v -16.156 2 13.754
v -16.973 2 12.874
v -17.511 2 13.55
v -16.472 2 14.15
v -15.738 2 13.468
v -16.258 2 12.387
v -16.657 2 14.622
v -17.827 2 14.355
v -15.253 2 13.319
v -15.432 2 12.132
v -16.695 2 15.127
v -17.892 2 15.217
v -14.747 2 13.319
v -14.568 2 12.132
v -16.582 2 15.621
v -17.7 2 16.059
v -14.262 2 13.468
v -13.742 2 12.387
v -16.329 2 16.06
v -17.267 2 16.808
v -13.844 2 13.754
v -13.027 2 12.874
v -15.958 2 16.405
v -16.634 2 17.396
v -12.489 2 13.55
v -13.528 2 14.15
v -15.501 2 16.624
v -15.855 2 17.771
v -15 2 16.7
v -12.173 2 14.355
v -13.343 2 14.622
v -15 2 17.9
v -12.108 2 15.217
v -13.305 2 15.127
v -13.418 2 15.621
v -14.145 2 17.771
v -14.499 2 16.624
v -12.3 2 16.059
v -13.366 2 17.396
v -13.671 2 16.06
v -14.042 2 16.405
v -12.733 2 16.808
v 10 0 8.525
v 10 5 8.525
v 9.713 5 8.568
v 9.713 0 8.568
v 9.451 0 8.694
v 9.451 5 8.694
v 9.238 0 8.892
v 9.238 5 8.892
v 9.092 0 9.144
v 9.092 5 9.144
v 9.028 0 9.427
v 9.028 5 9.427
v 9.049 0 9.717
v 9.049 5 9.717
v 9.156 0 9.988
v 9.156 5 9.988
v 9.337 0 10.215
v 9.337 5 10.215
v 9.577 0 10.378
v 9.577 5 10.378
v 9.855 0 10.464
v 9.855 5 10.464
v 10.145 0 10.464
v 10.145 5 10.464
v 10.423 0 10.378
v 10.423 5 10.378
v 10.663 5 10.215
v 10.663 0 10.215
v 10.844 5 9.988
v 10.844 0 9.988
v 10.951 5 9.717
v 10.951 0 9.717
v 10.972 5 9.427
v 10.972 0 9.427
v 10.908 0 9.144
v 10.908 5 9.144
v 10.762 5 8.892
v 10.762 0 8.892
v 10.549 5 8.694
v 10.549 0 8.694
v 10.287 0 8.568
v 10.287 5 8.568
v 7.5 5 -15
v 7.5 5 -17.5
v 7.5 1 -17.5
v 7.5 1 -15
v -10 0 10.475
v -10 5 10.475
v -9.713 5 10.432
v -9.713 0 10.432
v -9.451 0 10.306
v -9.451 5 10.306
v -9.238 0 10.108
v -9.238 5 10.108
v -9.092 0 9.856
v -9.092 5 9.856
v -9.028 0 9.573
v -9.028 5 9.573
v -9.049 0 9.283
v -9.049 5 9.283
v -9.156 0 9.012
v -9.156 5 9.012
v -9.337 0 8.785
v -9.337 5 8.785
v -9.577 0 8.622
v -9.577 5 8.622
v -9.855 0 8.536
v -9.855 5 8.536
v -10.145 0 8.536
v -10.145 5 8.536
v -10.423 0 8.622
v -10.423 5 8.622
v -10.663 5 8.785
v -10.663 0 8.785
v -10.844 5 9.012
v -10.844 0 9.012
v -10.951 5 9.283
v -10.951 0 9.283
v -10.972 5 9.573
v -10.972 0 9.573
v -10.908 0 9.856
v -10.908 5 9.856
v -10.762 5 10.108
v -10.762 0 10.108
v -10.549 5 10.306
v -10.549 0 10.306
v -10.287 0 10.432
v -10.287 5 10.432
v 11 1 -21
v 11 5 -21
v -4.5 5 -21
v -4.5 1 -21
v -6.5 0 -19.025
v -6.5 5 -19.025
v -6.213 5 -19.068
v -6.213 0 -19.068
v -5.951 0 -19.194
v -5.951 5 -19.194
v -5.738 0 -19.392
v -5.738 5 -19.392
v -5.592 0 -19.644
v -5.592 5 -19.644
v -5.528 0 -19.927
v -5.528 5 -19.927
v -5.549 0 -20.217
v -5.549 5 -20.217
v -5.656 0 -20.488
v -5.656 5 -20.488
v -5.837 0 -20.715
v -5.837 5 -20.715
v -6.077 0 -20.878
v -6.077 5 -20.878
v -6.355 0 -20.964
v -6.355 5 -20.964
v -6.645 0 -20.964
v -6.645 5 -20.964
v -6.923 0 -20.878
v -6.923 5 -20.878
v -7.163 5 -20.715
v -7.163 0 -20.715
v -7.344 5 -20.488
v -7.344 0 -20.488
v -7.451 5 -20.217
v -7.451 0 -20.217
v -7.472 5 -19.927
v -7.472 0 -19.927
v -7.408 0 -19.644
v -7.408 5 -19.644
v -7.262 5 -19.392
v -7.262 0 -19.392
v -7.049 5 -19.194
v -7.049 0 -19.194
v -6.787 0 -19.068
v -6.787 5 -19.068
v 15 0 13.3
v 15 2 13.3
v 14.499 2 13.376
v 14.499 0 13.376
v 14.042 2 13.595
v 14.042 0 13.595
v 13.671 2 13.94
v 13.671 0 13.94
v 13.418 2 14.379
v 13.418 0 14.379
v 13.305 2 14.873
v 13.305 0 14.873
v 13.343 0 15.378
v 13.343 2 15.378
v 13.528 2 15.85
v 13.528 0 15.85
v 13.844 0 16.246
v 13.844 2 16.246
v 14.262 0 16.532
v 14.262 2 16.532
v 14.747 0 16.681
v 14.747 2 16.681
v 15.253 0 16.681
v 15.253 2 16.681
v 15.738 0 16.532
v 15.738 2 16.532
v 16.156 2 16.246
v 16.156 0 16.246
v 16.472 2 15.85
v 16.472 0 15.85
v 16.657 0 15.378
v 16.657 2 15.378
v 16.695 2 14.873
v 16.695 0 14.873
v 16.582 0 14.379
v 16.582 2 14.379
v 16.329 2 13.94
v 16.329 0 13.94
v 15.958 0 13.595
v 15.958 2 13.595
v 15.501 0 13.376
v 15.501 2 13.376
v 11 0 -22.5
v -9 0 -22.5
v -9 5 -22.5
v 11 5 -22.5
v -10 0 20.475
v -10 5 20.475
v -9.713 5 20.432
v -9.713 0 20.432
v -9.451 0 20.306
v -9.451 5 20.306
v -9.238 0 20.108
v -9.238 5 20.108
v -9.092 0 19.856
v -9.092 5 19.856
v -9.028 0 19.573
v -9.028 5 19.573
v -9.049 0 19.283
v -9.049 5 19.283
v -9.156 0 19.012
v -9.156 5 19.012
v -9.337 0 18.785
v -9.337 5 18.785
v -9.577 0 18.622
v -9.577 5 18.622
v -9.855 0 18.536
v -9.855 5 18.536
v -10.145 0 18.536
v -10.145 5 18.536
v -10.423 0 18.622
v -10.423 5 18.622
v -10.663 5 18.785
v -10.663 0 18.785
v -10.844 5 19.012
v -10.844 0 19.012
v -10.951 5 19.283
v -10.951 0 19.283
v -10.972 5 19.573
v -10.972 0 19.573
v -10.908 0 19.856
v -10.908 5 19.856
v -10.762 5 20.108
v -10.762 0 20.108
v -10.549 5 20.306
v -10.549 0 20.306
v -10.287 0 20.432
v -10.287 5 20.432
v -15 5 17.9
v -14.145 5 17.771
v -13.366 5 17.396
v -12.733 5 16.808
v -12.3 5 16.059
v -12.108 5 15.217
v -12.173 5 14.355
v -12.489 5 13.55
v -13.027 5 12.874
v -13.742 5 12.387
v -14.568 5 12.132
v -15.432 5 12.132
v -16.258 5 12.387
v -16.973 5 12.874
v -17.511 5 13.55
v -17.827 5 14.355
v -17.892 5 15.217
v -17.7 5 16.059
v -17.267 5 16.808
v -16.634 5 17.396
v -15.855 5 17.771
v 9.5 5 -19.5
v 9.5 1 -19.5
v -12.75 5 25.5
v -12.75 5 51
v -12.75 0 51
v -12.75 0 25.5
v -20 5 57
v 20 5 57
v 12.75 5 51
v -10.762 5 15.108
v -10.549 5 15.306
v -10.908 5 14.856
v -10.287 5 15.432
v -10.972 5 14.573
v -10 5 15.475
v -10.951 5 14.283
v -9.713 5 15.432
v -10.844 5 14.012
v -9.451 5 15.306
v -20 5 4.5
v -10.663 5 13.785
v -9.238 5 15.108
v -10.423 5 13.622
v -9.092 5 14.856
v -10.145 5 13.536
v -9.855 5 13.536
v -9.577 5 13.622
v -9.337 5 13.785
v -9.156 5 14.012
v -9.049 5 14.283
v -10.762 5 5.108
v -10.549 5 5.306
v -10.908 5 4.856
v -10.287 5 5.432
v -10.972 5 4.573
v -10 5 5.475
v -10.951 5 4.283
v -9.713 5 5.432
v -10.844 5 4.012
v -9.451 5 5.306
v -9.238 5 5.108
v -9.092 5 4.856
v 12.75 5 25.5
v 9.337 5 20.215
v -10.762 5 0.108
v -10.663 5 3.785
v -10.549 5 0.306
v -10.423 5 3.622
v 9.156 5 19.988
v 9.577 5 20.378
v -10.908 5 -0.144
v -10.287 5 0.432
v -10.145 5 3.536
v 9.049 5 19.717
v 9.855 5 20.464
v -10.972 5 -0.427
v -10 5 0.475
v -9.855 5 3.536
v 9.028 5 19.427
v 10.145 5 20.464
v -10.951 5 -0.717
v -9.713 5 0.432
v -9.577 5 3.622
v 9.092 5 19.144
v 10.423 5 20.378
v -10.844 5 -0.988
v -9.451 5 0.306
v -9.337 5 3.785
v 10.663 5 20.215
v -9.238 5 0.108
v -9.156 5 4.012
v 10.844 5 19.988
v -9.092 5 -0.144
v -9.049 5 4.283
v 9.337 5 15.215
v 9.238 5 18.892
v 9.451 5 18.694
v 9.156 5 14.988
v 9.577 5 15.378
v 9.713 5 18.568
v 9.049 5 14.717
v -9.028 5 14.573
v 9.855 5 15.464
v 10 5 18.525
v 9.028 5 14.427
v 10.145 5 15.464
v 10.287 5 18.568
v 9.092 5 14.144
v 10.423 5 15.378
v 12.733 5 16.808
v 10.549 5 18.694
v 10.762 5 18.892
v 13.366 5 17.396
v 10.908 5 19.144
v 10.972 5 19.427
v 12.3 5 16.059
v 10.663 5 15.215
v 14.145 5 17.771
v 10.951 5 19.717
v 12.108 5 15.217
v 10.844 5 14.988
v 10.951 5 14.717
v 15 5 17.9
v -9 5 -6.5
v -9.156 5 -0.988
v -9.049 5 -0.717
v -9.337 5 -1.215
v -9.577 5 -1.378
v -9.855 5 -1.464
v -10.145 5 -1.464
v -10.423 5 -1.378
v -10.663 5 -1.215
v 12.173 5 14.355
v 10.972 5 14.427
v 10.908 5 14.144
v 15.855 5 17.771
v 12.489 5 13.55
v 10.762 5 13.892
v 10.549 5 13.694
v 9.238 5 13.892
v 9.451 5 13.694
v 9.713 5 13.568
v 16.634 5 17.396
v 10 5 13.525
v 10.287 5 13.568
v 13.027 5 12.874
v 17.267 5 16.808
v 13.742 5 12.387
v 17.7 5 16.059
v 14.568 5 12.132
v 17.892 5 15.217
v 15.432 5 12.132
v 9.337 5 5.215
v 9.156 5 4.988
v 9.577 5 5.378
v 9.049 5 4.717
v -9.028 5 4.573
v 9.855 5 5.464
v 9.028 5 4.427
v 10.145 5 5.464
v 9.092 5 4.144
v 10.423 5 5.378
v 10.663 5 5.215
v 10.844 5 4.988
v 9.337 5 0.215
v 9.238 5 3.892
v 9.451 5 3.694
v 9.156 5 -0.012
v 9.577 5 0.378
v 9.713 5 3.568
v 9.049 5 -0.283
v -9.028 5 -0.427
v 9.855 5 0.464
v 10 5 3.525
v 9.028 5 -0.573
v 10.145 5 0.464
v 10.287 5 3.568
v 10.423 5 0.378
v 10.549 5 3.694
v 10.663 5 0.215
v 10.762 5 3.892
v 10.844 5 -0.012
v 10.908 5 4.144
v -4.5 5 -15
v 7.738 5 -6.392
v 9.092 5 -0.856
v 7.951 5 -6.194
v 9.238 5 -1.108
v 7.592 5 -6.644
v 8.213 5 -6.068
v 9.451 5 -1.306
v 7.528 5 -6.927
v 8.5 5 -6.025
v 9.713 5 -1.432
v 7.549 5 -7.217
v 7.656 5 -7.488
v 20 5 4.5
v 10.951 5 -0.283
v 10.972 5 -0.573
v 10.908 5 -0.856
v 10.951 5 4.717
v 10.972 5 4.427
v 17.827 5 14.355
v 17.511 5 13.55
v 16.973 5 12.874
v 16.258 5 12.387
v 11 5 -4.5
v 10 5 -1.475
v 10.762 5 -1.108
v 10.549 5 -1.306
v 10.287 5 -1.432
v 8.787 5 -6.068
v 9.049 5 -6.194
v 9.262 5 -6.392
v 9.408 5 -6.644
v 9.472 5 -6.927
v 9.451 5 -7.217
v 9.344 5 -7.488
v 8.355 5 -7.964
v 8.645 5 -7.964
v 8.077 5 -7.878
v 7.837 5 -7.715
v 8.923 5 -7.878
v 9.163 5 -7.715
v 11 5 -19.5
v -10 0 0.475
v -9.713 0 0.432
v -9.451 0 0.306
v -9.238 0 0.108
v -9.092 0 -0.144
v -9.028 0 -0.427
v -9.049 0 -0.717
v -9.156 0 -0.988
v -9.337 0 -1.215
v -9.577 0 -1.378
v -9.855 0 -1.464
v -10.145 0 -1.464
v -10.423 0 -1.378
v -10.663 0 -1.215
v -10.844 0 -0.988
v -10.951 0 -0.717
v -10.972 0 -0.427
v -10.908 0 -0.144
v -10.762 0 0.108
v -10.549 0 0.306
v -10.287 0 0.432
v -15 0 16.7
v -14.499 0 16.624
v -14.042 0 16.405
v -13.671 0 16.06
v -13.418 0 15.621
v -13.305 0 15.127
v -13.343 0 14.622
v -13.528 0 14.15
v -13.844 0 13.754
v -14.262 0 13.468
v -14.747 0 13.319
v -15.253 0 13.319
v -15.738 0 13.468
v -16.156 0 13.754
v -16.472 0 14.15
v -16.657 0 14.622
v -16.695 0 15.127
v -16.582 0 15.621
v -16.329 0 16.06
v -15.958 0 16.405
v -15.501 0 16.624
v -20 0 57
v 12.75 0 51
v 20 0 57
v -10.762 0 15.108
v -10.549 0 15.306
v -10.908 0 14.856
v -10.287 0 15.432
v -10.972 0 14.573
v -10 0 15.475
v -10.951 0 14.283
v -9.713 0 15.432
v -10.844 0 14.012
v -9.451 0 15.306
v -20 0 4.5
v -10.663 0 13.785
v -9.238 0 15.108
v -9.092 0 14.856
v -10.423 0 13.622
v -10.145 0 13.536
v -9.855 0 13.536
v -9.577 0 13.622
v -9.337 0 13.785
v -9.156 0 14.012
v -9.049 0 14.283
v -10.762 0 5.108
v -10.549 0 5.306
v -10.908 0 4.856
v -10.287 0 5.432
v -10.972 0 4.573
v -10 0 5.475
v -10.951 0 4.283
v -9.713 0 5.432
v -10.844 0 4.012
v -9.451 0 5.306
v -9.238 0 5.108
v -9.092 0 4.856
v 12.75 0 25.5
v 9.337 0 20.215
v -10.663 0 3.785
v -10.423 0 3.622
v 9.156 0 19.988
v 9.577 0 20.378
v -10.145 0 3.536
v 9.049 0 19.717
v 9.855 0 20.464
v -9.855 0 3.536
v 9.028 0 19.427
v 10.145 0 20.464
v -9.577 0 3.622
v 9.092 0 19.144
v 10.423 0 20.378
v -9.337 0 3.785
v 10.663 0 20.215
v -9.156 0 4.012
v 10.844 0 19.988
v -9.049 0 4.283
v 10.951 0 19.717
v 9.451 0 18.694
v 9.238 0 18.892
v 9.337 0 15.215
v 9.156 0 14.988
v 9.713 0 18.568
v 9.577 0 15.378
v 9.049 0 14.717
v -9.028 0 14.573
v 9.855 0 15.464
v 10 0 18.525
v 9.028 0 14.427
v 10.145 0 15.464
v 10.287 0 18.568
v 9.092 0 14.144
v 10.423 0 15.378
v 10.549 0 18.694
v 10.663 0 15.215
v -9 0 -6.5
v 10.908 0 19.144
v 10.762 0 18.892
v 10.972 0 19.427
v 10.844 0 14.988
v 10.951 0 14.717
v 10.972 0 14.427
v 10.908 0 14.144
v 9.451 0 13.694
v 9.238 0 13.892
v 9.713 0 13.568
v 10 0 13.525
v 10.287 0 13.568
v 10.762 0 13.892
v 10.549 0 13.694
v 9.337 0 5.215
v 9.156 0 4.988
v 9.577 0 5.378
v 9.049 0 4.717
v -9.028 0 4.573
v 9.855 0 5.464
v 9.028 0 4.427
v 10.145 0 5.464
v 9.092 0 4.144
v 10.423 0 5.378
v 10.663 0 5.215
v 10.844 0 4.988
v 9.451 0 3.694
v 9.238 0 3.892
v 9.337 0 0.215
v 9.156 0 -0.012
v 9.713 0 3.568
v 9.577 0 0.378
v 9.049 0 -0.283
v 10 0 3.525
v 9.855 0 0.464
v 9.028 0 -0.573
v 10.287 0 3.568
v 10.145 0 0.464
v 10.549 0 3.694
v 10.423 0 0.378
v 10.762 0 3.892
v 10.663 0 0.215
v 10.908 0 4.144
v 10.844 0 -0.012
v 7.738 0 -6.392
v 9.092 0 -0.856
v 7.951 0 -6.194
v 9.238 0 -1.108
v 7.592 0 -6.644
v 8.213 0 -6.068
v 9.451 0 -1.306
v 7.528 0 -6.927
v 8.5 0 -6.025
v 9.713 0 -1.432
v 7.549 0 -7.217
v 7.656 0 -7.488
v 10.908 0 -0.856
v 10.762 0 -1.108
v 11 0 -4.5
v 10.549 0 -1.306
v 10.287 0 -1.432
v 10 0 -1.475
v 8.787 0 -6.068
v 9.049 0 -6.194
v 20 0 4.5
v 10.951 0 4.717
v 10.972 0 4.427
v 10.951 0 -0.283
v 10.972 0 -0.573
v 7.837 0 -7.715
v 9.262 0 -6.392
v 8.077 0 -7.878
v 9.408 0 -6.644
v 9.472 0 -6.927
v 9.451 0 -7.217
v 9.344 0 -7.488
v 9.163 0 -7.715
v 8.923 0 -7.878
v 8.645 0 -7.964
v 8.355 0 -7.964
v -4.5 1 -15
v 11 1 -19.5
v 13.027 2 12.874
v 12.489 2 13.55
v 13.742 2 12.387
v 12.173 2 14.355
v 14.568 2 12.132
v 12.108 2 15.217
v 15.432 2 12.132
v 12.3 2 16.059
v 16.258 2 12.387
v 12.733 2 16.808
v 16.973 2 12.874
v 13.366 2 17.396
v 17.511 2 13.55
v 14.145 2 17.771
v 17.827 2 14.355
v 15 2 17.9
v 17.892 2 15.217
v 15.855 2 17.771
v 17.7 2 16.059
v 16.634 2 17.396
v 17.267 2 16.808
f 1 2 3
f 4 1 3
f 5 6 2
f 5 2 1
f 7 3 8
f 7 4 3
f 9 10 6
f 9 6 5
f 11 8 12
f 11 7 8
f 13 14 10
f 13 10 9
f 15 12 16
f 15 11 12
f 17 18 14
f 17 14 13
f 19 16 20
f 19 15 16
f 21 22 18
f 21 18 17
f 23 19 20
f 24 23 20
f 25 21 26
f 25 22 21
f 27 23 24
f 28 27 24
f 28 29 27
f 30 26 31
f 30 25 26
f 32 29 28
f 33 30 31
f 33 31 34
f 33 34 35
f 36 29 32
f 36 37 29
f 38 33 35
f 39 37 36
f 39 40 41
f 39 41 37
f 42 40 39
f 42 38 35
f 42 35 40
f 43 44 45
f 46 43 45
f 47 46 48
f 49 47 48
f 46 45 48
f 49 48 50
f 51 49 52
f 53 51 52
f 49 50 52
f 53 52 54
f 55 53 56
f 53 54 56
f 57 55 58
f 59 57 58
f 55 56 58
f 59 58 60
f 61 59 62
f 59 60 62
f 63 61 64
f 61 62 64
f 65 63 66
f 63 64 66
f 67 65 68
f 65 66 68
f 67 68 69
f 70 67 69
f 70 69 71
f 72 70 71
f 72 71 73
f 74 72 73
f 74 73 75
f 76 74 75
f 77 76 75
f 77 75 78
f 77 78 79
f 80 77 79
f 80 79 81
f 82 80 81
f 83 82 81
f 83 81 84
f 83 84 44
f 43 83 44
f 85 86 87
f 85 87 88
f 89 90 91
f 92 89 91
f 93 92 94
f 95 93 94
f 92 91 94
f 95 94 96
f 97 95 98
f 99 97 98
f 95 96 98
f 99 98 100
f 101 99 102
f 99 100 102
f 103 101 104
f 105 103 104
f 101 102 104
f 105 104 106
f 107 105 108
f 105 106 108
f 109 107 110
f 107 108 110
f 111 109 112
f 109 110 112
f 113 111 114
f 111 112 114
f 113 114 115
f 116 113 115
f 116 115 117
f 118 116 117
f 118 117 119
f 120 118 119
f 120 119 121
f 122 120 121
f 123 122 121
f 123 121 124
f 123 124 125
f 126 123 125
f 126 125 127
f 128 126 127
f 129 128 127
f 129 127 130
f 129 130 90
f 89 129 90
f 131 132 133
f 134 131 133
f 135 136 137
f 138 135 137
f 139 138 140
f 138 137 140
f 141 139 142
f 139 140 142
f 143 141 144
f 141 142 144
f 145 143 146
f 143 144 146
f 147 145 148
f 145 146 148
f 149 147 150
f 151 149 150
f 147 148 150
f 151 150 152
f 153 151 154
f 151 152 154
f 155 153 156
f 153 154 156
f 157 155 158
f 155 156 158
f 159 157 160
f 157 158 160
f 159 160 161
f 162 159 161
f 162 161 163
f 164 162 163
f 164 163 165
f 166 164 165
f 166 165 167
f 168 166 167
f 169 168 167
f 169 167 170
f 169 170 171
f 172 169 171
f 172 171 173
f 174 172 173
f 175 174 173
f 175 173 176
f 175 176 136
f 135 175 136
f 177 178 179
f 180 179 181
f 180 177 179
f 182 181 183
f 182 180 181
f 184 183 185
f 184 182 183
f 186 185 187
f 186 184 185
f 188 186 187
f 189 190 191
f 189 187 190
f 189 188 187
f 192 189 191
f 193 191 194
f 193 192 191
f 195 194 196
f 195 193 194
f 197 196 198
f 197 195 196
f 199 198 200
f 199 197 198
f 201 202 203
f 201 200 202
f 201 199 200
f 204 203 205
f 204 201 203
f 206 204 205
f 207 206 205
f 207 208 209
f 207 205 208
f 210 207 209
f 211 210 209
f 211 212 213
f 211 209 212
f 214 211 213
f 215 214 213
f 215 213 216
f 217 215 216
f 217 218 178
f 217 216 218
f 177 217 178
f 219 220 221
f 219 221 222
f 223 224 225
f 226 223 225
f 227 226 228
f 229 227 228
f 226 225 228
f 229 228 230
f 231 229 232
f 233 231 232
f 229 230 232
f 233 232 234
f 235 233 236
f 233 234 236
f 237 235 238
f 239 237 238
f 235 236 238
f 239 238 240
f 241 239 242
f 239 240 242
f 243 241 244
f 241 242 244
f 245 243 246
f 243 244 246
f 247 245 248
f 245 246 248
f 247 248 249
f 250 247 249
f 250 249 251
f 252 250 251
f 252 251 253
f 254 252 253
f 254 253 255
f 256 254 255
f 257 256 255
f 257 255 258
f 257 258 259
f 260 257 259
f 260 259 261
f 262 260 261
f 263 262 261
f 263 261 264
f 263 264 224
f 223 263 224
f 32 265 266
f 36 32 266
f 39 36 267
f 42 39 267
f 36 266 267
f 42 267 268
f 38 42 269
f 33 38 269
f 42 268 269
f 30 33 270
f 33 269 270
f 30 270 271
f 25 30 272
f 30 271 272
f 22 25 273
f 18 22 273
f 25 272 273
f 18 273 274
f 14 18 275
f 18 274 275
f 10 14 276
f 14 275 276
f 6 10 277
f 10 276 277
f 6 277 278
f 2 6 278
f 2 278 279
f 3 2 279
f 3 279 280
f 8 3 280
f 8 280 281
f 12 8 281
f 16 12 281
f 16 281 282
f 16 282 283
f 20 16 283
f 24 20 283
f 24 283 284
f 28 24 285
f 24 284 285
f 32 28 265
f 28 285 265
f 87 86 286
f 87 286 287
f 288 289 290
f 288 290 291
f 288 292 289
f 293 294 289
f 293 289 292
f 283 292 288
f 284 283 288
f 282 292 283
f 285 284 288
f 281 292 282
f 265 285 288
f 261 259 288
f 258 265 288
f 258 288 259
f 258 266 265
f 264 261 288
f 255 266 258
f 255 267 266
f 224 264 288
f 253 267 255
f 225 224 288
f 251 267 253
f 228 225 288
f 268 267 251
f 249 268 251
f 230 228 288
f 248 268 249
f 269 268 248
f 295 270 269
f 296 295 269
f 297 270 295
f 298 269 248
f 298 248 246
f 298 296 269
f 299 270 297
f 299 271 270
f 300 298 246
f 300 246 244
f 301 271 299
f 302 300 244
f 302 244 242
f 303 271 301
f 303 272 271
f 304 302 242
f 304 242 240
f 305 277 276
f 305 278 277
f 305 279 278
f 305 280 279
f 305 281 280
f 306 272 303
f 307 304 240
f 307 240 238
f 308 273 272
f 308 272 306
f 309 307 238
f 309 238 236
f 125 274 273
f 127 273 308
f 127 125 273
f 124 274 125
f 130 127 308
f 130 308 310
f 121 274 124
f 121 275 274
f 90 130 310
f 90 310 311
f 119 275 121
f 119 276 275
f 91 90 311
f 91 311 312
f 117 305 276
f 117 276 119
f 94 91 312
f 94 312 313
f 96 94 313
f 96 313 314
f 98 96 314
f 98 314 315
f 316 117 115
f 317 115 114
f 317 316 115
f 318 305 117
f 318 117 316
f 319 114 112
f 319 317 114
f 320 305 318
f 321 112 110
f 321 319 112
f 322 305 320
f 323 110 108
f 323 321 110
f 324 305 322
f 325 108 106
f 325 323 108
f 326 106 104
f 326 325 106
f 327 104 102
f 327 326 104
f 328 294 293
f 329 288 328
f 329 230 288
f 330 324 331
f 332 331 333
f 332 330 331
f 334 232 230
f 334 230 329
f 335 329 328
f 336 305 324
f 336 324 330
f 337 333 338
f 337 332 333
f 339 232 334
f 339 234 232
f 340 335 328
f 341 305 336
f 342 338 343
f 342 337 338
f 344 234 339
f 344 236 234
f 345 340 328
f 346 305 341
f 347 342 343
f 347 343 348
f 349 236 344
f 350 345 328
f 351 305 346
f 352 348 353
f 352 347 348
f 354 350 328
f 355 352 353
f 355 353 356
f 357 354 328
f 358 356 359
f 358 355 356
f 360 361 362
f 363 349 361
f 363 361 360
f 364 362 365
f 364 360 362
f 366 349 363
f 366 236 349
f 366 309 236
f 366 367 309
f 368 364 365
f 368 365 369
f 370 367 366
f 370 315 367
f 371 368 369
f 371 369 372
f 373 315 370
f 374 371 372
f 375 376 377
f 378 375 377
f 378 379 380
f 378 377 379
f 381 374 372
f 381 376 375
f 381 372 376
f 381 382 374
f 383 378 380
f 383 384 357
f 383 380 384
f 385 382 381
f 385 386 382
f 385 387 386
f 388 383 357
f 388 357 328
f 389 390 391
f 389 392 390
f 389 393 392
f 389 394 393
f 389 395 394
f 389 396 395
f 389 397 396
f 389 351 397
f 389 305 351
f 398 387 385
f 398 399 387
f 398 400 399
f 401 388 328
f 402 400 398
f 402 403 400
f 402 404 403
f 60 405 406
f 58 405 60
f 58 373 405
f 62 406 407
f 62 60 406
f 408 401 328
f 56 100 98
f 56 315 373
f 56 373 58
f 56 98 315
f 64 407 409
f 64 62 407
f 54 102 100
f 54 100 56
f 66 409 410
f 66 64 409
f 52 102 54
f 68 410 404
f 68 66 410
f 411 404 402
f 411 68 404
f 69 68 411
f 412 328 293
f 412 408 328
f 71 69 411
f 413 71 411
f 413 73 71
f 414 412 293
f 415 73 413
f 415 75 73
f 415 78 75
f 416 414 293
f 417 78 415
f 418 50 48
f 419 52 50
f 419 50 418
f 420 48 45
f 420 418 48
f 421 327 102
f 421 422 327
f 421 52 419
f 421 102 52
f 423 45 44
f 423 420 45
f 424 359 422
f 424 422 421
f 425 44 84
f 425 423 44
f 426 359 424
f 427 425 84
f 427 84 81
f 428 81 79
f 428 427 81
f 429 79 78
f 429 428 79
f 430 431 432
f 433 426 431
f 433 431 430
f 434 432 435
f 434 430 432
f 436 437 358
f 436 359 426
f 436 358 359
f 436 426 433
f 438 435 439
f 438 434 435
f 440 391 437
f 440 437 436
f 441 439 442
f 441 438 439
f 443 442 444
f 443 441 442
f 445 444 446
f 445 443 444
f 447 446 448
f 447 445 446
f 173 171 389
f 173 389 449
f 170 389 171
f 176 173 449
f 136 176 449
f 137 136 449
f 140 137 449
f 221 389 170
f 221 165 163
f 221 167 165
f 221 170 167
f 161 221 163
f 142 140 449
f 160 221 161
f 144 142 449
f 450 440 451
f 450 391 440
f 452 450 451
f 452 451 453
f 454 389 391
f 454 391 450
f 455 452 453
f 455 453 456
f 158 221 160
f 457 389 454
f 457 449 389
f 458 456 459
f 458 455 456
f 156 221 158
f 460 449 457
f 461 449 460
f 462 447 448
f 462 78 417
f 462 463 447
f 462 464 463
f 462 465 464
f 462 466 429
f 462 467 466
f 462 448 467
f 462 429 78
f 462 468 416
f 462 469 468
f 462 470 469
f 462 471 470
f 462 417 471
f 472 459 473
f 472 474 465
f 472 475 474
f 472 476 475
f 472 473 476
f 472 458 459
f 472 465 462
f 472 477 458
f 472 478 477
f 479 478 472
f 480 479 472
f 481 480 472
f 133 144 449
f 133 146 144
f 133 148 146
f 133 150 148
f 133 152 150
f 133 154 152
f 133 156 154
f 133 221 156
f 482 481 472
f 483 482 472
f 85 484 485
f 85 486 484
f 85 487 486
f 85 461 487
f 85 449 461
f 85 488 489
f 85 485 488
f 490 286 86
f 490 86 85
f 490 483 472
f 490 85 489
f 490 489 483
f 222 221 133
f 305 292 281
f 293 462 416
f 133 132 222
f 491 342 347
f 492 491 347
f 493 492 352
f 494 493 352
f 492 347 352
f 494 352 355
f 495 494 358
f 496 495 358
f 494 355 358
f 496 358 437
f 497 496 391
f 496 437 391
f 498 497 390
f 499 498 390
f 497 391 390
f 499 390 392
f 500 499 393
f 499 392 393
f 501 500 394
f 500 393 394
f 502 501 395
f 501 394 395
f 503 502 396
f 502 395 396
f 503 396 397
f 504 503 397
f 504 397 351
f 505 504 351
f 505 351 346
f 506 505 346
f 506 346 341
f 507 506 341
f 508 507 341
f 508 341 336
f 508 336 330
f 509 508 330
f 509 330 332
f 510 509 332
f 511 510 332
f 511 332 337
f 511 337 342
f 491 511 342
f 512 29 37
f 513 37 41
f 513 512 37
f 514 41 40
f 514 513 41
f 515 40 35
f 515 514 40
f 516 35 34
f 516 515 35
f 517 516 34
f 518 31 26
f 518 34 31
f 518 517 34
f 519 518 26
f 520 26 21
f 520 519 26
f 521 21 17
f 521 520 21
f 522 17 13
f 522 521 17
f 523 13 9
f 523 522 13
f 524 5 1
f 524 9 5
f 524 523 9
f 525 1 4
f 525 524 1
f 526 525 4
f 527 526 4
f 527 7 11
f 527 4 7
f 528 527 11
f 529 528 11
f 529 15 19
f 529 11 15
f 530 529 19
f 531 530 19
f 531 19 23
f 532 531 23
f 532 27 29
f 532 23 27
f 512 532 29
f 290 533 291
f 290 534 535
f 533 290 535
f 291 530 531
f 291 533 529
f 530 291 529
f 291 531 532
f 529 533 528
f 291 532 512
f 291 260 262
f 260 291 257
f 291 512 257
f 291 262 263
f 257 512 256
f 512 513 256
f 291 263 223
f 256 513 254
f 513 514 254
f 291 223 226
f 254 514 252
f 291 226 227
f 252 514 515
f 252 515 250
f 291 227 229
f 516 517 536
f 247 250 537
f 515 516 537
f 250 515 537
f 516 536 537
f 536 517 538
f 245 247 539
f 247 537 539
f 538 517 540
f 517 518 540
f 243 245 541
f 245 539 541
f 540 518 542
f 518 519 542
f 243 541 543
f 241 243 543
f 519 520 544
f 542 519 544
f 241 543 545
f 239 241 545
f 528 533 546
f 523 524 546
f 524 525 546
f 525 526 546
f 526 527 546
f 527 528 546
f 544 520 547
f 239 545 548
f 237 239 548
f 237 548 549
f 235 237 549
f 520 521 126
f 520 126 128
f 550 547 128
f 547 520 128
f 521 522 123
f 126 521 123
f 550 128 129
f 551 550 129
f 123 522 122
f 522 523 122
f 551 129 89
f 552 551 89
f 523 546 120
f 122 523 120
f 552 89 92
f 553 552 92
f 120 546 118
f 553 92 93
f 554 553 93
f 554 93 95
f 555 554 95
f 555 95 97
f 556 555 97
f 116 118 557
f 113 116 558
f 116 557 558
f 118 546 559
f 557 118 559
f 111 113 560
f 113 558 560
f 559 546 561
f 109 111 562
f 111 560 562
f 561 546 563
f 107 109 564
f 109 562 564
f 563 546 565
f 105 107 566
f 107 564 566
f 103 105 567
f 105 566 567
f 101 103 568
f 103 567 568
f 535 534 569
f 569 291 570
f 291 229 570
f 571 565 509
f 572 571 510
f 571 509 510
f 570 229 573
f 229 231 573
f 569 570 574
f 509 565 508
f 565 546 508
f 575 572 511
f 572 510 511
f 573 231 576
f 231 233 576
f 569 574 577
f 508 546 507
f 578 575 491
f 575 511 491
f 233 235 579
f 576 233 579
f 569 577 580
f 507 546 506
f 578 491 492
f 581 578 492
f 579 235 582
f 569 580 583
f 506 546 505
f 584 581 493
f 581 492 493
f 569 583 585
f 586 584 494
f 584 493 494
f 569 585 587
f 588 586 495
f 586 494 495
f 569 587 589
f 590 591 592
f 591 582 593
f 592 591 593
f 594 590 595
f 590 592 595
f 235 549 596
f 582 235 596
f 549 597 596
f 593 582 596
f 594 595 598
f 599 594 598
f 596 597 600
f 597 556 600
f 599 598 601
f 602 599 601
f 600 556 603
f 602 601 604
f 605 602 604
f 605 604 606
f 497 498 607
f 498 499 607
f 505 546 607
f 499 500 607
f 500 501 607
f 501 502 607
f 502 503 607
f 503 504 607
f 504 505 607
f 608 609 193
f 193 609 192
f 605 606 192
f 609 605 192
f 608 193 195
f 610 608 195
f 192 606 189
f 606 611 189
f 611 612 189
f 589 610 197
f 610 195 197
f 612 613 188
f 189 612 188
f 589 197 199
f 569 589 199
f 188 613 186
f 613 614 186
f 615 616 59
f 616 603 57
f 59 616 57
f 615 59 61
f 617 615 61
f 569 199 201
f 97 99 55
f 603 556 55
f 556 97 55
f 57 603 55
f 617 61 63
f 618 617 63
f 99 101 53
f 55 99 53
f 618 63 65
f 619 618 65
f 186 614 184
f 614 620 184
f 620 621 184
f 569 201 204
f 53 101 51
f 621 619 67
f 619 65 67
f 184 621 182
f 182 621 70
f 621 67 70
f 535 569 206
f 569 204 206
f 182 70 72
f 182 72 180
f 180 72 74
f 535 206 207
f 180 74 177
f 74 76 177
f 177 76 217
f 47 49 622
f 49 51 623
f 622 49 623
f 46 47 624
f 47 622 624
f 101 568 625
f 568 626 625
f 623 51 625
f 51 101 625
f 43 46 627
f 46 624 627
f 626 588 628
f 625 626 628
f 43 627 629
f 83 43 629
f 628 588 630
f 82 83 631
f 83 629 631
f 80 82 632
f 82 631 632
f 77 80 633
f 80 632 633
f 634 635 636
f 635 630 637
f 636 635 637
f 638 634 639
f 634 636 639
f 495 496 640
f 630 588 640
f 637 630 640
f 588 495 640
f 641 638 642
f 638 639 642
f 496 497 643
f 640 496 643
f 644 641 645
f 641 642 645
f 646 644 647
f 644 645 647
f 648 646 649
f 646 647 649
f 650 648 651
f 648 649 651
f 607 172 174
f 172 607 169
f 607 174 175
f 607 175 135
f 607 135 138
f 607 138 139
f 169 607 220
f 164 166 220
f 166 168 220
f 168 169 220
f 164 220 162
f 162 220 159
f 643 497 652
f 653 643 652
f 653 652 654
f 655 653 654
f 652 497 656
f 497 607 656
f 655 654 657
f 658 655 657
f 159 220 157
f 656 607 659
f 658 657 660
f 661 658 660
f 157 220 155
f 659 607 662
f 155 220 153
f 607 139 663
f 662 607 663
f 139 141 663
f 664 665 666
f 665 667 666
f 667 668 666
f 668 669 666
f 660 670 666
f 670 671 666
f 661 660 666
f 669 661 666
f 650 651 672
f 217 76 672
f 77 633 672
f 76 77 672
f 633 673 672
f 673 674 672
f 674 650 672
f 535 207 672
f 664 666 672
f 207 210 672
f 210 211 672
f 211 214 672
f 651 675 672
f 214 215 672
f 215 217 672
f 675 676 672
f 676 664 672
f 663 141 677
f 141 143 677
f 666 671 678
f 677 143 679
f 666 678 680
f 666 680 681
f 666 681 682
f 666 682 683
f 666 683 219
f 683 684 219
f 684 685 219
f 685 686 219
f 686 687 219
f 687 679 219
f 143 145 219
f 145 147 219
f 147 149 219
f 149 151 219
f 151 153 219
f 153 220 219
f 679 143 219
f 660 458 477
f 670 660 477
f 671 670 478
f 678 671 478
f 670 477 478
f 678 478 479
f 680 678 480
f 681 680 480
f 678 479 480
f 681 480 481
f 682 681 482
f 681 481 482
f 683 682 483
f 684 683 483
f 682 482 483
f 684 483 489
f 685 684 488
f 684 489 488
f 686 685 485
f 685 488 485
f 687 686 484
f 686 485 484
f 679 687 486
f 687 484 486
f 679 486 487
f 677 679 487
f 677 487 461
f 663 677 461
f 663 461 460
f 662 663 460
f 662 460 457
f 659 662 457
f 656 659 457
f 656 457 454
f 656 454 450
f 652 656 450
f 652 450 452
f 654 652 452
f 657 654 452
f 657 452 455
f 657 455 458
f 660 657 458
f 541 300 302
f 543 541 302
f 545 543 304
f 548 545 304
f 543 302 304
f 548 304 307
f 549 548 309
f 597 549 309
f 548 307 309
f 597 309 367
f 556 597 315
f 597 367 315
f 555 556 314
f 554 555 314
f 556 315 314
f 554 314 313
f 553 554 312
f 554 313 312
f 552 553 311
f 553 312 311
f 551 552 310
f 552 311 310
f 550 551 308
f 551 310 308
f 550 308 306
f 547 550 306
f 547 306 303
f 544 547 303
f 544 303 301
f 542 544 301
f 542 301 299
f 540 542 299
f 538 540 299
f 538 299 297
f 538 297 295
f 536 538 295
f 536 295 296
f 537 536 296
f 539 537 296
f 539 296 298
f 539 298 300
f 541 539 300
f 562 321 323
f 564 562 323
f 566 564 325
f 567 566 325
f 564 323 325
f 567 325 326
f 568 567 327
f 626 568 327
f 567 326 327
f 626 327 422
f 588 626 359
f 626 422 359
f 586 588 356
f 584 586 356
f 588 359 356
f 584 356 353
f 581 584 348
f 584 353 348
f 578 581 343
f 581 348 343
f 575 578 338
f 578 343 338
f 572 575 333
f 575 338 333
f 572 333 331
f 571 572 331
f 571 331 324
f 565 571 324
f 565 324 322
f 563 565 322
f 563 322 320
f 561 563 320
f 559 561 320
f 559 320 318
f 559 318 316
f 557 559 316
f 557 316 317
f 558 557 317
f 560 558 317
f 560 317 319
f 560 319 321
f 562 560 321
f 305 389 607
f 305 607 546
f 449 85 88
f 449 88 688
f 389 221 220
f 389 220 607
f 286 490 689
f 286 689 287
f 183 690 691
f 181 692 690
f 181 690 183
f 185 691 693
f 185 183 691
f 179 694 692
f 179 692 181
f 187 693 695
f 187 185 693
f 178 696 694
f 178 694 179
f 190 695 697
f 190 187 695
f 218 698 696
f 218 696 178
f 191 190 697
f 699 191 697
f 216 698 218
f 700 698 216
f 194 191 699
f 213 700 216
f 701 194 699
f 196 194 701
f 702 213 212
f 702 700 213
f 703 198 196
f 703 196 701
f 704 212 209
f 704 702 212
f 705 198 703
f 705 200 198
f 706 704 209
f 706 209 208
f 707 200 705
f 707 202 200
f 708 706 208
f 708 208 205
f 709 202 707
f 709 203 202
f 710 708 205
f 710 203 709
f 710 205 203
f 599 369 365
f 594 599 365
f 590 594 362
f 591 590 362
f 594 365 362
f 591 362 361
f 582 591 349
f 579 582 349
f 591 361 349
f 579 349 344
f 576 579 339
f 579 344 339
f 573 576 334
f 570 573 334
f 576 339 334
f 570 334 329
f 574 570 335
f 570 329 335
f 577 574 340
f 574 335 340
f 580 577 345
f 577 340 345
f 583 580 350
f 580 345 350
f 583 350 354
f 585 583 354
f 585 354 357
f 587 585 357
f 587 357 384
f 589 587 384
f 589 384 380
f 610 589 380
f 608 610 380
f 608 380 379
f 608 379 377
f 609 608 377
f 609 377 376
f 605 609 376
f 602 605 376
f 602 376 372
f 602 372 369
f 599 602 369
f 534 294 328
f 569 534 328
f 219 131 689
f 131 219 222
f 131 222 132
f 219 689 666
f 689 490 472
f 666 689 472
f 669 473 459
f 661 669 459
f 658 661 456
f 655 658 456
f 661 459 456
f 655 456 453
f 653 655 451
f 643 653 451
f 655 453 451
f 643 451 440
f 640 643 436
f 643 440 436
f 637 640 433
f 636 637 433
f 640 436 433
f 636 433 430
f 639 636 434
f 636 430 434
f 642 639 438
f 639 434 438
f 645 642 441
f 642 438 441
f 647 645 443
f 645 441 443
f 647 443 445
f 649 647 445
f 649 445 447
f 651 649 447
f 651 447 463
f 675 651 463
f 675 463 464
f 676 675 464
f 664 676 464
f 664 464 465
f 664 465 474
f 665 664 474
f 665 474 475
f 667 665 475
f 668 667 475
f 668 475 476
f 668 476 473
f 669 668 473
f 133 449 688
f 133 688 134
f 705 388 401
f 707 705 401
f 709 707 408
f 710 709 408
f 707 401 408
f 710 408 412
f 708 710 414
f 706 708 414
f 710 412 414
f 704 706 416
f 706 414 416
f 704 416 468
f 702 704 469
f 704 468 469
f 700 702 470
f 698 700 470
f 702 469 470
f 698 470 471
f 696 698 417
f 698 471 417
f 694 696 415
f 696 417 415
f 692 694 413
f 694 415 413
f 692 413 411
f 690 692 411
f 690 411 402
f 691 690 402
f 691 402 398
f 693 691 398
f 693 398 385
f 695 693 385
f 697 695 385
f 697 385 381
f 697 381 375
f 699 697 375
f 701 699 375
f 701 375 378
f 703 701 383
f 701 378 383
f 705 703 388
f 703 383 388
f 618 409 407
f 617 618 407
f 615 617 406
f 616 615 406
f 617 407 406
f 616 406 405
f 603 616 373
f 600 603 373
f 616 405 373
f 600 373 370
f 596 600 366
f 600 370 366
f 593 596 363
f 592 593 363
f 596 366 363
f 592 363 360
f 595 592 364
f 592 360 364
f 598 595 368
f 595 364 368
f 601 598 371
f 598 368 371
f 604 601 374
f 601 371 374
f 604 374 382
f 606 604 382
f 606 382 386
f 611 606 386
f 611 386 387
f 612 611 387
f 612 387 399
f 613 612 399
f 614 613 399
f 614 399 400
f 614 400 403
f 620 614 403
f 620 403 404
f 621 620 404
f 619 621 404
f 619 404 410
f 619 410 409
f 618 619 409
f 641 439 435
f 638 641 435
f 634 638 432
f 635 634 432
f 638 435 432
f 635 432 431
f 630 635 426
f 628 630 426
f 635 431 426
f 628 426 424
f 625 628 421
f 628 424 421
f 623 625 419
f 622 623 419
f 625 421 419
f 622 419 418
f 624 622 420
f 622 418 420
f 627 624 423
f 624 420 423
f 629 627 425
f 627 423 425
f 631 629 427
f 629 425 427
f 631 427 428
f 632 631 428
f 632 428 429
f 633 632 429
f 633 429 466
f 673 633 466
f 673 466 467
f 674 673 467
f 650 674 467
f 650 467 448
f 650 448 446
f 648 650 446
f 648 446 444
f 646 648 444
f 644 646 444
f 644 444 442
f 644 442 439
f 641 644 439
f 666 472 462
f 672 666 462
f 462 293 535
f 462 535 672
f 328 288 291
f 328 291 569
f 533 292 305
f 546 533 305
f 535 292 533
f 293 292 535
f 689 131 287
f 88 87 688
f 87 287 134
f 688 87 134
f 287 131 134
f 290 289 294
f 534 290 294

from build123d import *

# Parameters (mm, degrees)
SKETCH1_W           = 40
SKETCH1_H           = 45
SKETCH1_R           = 1.7
BOSS_EXTRUDE1_DEPTH = 5
SKETCH7_R           = 2.9
CUT_EXTRUDE6_DEPTH  = 3
SKETCH4_R           = 0.975
CUT_EXTRUDE3_DEPTH  = 31.516389039
SKETCH5_R           = 0.975
CUT_EXTRUDE4_DEPTH  = 31.516389039
LPATTERN1_COUNT     = 5
LPATTERN1_PITCH     = 5
CUT_EXTRUDE7_DEPTH  = 4
FILLET2_R           = 3
CHAMFER2_SIZE       = 2
CUT_EXTRUDE8_DEPTH  = 31.516389039
SKETCH10_W          = 40
SKETCH10_H          = 34.5
SKETCH10_W_2        = 25.5
SKETCH10_H_2        = 25.5
BOSS_EXTRUDE2_DEPTH = 5


with BuildPart() as part:
    # Sketch1 → Boss-Extrude1 (new body)
    with BuildSketch(Plane(origin=(0, 0, 0), x_dir=(1, 0, 0), z_dir=(0, 1, 0))):
        Rectangle(SKETCH1_W, SKETCH1_H)
        with Locations(Location((-15, 15, 0), (0, 0, 270))):
            Circle(SKETCH1_R, mode=Mode.SUBTRACT)
        with Locations(Location((-15, -15, 0), (0, 0, 270))):
            Circle(SKETCH1_R, mode=Mode.SUBTRACT)
        with Locations(Location((15, -15, 0), (0, 0, 90))):
            Circle(SKETCH1_R, mode=Mode.SUBTRACT)
        with Locations(Location((15, 15, 0), (0, 0, 90))):
            Circle(SKETCH1_R, mode=Mode.SUBTRACT)
    extrude(amount=BOSS_EXTRUDE1_DEPTH)

    # Sketch7 → Cut-Extrude6 (cut)
    with BuildSketch(Plane(origin=(0, 5, 0), x_dir=(1, 0, 0), z_dir=(0, 1, 0))):
        with Locations(Location((-15, 15, 0), (0, 0, 270))):
            Circle(SKETCH7_R)
        with Locations(Location((15, 15, 0), (0, 0, 270))):
            Circle(SKETCH7_R)
        with Locations(Location((-15, -15, 0), (0, 0, 270))):
            Circle(SKETCH7_R)
        with Locations(Location((15, -15, 0), (0, 0, 270))):
            Circle(SKETCH7_R)
    extrude(amount=-CUT_EXTRUDE6_DEPTH, mode=Mode.SUBTRACT)

    # Sketch4 → Cut-Extrude3 (cut, through all)
    with BuildSketch(Plane(origin=(0, 5, 0), x_dir=(1, 0, 0), z_dir=(0, 1, 0))):
        with Locations(Location((-6.5, 20, 0), (0, 0, 270))):
            Circle(SKETCH4_R)
        with Locations(Location((8.5, 7, 0), (0, 0, 270))):
            Circle(SKETCH4_R)
    extrude(amount=-CUT_EXTRUDE3_DEPTH, mode=Mode.SUBTRACT)

    # Sketch5 → Cut-Extrude4 (cut, through all)
    with BuildSketch(Plane(origin=(0, 5, 0), x_dir=(1, 0, 0), z_dir=(0, 1, 0))):
        with Locations(Location((-10, -19.5, 0), (0, 0, 270))):
            Circle(SKETCH5_R)
        with Locations(Location((10, -19.5, 0), (0, 0, 90))):
            Circle(SKETCH5_R)
    cut_extrude4 = extrude(amount=-CUT_EXTRUDE4_DEPTH, mode=Mode.SUBTRACT)

    # LPattern1: Cut-Extrude4 ×5
    with Locations(*[(0, 0, -i * LPATTERN1_PITCH) for i in range(1, LPATTERN1_COUNT)]):
        add(cut_extrude4, mode=Mode.SUBTRACT)

    # Sketch8 → Cut-Extrude7 (cut)
    with BuildSketch(Plane(origin=(0, 5, 0), x_dir=(1, 0, 0), z_dir=(0, 1, 0))):
        Polygon((-4.5, 21), (7.5, 21), (15.5, 21), (15.5, 19.5), (7.5, 19.5), (7.5, 15), (-4.5, 15), align=None)
    extrude(amount=-CUT_EXTRUDE7_DEPTH, mode=Mode.SUBTRACT)

    # Fillet2
    fillet2_edges = [part.edges().sort_by_distance(p)[0] for p in [
        (15.5, 1, -20.25),
    ]]
    fillet(fillet2_edges, radius=FILLET2_R)

    # Chamfer2
    chamfer2_edges = [part.edges().sort_by_distance(p)[0] for p in [
        (7.5, 3, -19.5),
    ]]
    chamfer(chamfer2_edges, length=CHAMFER2_SIZE)

    # Sketch9 → Cut-Extrude8 (cut, through all)
    with BuildSketch(Plane(origin=(0, 5, 0), x_dir=(1, 0, 0), z_dir=(0, 1, 0))):
        Polygon((-9, 22.5), (-9, 6.5), (-20, -4.5), (-20, 22.5), align=None)
        Polygon((20, 22.5), (11, 22.5), (11, 4.5), (20, -4.5), align=None)
    extrude(amount=-CUT_EXTRUDE8_DEPTH, mode=Mode.SUBTRACT)

    # Sketch10 → Boss-Extrude2 (add)
    with BuildSketch(Plane(origin=(0, 5, 0), x_dir=(1, 0, 0), z_dir=(0, 1, 0))):
        with Locations((0, -39.75)):
            Rectangle(SKETCH10_W, SKETCH10_H)
        with Locations((0, -38.25)):
            Rectangle(SKETCH10_W_2, SKETCH10_H_2, mode=Mode.SUBTRACT)
    extrude(amount=-BOSS_EXTRUDE2_DEPTH)


solid = part.part
